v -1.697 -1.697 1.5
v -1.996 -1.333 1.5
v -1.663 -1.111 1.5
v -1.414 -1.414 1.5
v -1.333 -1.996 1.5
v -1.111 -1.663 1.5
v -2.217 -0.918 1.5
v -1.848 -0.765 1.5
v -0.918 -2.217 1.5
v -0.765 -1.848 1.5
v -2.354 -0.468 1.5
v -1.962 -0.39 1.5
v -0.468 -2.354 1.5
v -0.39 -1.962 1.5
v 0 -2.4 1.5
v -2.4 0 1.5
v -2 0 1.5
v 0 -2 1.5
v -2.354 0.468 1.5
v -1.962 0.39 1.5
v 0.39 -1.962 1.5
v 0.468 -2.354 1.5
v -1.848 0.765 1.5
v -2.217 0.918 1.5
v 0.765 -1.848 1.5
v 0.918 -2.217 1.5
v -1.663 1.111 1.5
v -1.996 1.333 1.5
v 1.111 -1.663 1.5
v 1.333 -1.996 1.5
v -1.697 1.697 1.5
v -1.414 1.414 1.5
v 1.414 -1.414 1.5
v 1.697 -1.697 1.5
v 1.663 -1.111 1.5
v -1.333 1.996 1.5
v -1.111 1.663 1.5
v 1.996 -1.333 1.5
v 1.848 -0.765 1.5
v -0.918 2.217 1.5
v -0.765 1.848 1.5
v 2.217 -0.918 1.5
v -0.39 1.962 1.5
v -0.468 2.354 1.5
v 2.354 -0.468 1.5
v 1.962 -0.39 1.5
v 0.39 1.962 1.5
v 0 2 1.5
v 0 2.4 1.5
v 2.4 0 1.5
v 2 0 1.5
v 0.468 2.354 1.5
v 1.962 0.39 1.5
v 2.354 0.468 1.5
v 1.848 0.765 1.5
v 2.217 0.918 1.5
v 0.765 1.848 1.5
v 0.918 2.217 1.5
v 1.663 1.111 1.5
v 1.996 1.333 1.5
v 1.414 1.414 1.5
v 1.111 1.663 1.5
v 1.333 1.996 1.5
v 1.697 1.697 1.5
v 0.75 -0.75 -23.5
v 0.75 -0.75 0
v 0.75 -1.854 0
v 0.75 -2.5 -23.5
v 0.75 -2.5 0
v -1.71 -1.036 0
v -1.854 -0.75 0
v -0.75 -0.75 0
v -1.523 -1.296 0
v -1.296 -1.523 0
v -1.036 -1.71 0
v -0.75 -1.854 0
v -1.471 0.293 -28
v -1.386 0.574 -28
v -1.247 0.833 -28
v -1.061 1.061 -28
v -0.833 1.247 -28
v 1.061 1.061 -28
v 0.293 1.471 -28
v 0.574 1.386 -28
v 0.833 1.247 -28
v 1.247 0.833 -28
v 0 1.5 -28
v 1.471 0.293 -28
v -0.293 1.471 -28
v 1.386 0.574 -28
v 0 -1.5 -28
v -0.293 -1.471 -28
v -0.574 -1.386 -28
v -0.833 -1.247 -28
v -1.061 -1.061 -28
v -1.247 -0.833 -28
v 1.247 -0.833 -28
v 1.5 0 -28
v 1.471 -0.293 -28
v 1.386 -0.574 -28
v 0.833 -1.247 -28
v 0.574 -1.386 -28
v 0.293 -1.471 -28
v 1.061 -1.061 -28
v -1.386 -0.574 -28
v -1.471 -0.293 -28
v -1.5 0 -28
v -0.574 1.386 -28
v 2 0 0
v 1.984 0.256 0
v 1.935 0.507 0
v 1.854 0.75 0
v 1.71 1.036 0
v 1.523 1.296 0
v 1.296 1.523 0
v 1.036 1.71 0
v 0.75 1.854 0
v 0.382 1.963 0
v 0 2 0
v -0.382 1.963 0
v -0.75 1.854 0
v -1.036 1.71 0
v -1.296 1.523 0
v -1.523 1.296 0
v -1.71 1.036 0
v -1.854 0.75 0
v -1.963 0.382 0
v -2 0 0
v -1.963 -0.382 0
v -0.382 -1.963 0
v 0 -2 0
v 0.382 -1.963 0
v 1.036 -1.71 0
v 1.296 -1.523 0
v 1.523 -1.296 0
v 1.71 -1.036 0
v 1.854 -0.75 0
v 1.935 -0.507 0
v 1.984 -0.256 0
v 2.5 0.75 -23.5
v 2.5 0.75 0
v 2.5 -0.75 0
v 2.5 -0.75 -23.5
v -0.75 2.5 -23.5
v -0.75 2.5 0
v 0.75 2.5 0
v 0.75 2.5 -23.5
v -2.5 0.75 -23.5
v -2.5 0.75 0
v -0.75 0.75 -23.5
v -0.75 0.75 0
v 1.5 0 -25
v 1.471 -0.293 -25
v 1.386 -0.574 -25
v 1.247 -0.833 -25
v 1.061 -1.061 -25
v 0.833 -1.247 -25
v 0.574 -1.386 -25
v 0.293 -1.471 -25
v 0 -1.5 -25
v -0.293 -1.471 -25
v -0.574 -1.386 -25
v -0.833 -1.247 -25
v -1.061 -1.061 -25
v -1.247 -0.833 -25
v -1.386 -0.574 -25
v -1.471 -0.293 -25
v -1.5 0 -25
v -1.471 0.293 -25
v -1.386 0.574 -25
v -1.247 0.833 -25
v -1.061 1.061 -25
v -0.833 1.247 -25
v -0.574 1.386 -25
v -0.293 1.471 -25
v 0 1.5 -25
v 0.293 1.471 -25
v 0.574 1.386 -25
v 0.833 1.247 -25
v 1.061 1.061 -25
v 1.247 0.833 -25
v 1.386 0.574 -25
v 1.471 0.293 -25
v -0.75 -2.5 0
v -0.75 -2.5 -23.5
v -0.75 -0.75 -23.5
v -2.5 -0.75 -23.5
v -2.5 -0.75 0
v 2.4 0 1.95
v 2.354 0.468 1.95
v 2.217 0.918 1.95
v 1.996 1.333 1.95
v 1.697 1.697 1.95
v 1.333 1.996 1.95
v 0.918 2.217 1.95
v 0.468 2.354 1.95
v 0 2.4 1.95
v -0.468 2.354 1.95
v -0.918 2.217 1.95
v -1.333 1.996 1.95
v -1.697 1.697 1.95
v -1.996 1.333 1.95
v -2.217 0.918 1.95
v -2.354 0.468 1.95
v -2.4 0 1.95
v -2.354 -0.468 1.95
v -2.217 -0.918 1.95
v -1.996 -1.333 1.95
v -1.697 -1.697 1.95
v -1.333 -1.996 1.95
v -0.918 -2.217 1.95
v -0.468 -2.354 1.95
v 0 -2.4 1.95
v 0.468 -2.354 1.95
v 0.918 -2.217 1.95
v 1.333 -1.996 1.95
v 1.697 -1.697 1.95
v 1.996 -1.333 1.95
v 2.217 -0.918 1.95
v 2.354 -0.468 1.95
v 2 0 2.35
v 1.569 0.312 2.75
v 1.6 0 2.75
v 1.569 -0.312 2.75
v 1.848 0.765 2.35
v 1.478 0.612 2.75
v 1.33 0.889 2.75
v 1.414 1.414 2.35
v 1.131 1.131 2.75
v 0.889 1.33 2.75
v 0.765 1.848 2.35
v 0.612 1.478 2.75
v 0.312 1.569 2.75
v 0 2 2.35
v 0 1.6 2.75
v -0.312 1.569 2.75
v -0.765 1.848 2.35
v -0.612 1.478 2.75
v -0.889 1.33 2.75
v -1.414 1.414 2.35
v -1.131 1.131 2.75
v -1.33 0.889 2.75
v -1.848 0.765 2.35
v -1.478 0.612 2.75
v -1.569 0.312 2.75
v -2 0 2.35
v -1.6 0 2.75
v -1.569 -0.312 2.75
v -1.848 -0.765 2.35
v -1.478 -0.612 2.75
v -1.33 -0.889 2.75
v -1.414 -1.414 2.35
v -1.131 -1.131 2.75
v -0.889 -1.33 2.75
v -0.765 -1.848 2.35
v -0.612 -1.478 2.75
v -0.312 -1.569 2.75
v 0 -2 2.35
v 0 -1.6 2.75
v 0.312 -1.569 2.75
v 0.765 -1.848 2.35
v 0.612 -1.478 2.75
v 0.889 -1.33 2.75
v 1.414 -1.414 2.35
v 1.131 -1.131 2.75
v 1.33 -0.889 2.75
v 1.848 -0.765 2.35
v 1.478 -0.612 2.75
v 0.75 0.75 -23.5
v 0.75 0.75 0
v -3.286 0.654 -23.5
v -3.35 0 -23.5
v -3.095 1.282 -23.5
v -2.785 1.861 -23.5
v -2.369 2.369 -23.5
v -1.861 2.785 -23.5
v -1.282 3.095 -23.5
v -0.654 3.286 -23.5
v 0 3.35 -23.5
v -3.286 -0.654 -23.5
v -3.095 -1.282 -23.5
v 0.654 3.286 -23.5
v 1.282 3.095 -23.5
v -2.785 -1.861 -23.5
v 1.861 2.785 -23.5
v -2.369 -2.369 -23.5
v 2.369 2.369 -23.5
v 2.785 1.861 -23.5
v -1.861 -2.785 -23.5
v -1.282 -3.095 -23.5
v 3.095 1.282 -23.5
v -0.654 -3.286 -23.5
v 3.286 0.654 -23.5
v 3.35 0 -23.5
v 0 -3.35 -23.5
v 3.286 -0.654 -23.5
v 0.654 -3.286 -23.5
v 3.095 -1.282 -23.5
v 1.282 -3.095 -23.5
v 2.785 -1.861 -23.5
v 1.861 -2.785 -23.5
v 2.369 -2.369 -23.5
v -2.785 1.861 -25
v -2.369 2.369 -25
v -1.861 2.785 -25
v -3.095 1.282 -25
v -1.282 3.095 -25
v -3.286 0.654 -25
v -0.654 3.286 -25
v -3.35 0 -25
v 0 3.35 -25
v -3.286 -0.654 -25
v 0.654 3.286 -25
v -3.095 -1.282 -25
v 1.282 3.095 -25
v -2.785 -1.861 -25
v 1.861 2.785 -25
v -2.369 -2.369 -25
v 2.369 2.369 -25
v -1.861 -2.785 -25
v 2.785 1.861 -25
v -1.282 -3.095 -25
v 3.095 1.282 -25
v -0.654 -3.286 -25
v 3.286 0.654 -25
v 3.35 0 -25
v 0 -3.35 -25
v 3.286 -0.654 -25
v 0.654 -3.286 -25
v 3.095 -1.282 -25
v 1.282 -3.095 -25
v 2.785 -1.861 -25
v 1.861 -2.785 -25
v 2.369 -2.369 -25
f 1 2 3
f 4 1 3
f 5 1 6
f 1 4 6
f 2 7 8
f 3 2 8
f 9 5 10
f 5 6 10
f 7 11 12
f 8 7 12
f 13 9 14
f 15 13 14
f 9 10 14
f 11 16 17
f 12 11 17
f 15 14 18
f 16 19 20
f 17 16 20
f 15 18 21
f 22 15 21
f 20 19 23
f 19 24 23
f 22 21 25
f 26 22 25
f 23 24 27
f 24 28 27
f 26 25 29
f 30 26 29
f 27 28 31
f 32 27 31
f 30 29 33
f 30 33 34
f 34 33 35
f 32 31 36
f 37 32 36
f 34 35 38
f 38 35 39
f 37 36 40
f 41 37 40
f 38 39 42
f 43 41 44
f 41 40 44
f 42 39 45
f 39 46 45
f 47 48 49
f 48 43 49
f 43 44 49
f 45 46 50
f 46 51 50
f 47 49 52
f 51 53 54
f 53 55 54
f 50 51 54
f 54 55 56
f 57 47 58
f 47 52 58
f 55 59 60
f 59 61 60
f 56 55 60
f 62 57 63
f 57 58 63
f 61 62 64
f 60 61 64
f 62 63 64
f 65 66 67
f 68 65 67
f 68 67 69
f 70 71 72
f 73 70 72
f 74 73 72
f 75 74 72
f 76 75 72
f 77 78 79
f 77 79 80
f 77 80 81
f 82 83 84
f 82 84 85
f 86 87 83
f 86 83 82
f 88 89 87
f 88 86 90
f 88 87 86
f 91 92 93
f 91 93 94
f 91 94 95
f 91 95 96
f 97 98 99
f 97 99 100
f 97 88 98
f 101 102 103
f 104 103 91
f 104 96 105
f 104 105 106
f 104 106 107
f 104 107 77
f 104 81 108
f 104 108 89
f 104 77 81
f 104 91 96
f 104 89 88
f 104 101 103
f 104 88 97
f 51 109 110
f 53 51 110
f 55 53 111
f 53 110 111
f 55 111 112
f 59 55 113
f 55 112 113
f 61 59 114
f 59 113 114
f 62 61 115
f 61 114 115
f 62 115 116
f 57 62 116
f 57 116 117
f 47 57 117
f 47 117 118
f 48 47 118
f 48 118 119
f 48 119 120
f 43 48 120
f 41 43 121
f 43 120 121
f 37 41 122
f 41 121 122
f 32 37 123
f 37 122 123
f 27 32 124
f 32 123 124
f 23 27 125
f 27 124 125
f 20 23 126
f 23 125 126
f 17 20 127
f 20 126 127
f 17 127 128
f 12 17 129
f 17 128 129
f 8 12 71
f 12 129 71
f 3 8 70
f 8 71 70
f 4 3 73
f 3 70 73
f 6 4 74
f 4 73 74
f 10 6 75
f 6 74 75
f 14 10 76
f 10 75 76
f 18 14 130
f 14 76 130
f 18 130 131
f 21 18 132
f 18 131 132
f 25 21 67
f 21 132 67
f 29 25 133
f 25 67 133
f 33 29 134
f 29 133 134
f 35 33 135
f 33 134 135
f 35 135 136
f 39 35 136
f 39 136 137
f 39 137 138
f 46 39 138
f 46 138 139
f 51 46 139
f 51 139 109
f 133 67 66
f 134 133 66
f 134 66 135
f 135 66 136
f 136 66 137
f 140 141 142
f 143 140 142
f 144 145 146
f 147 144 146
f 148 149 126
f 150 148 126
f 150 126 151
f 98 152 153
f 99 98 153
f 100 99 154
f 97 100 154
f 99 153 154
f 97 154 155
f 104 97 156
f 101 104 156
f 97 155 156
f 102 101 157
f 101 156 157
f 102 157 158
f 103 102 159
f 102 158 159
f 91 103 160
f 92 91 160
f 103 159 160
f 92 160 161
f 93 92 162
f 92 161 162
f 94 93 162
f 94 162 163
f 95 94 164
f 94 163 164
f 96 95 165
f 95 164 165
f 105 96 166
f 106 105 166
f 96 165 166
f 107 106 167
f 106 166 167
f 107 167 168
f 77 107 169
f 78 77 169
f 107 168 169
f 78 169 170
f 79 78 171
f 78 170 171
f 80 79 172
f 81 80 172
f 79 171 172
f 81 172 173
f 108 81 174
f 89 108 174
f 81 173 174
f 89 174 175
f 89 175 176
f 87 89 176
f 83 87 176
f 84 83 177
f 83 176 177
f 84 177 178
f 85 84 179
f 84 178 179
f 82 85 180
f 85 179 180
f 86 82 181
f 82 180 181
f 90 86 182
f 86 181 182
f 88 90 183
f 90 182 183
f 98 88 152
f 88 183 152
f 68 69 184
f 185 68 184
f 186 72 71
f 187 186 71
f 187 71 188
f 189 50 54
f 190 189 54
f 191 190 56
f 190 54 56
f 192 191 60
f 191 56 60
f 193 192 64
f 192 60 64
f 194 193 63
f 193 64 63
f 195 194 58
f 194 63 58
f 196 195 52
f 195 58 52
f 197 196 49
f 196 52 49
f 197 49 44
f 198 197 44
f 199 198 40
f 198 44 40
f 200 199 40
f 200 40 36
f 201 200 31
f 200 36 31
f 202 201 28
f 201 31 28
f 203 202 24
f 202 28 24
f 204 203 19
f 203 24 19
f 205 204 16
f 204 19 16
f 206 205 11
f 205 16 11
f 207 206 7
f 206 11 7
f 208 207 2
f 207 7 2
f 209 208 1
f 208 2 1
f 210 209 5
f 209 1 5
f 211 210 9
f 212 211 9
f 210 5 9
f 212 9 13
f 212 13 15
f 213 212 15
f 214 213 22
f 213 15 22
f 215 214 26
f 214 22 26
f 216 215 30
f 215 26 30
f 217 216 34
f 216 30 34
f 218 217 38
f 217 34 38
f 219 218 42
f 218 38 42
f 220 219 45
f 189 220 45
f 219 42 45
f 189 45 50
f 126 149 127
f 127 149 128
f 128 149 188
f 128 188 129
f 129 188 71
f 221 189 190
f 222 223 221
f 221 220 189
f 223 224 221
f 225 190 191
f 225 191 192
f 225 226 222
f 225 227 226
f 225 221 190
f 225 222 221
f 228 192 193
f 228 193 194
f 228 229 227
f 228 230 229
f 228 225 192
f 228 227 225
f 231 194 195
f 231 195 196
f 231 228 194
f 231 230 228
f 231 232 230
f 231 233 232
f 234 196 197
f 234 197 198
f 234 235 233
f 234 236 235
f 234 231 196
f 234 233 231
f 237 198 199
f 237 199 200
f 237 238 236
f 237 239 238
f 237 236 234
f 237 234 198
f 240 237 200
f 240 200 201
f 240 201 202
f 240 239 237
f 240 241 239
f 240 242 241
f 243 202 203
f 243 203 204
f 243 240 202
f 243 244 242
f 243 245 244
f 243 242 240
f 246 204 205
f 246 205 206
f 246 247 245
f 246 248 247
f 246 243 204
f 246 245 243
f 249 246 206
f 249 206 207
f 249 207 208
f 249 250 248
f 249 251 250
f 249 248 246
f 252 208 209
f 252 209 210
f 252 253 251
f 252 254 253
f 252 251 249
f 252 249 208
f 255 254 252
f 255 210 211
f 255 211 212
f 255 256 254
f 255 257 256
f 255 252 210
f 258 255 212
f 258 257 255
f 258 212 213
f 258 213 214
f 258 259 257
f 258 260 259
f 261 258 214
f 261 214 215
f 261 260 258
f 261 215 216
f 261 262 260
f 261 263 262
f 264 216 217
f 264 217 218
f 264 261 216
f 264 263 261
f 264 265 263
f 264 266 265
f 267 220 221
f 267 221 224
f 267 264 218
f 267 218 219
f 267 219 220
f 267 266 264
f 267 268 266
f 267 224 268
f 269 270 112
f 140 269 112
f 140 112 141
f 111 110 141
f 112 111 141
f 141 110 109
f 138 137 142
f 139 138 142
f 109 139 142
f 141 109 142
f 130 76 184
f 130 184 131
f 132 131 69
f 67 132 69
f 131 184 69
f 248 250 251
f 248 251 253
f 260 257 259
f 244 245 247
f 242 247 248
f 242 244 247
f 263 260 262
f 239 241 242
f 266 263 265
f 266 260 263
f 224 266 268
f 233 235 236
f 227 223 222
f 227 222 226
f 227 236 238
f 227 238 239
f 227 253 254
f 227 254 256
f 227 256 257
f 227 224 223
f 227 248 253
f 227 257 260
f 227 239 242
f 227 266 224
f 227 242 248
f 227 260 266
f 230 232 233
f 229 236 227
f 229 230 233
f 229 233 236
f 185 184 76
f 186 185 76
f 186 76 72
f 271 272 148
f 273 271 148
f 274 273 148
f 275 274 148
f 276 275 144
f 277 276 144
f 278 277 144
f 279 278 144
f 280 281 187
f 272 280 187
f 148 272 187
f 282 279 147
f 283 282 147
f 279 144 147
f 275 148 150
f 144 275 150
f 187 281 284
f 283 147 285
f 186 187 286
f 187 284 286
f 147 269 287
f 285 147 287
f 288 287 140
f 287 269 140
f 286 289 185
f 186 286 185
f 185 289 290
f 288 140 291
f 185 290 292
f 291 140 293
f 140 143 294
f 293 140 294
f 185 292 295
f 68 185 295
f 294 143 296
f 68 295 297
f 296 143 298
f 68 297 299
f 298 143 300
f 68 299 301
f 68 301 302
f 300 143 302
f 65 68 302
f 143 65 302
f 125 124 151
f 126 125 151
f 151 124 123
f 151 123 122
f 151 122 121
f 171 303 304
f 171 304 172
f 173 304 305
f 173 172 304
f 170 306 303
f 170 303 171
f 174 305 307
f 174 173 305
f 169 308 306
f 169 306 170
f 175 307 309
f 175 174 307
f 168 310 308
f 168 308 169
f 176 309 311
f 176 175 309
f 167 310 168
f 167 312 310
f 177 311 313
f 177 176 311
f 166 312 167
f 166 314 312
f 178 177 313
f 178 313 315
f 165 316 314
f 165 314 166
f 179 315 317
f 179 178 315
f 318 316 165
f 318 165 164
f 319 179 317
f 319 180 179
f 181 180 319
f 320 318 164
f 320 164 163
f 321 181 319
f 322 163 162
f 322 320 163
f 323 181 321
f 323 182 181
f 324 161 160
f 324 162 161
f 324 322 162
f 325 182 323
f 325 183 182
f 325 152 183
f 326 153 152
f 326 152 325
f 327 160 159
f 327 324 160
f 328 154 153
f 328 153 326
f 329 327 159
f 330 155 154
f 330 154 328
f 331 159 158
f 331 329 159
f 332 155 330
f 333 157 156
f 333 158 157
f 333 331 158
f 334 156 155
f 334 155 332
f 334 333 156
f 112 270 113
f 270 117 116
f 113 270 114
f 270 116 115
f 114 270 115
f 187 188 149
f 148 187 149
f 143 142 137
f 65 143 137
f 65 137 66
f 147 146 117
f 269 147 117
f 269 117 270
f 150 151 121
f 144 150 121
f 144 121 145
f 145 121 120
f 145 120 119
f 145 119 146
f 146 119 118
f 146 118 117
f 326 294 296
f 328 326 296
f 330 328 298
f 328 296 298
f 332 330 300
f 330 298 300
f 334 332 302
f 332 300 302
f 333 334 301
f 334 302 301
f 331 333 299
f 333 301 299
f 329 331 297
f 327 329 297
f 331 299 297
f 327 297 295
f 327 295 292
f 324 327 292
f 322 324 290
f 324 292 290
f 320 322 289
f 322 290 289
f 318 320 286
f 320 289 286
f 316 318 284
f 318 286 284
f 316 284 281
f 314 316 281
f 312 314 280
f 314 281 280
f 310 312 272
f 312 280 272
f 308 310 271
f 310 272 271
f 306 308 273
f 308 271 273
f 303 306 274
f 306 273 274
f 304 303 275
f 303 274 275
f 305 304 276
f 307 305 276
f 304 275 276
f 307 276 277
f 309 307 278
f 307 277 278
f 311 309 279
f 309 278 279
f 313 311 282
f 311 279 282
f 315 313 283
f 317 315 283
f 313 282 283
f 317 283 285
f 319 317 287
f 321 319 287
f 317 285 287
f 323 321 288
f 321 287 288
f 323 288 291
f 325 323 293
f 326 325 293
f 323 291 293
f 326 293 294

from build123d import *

# Parameters (mm, degrees)
F0_R      = 2
F1_DEPTH  = 1.5
F2_R      = 2.4
F2_R_2    = 2
F3_DEPTH  = 1.25
F4_SIZE   = 0.8
F6_DEPTH  = 23.5
F7_R      = 3.35
F8_DEPTH  = 1.5
F9_R      = 1.5
F10_DEPTH = 3


with BuildPart() as f1:
    # F0 (on Top) → F1 (new body)
    with BuildSketch(Plane.XY):
        Circle(F0_R)
    extrude(amount=F1_DEPTH)

    # F2 (on face) → F3 (join)
    with BuildSketch(Plane.XY.offset(1.5)):
        Circle(F2_R)
        Circle(F2_R_2, mode=Mode.SUBTRACT)
        Circle(F2_R_2)
    extrude(amount=F3_DEPTH)

    # F4
    f4_edges = [f1.edges().sort_by_distance(p)[0] for p in [
        (-2.4, 0, 2.75),
    ]]
    chamfer(f4_edges, length=F4_SIZE)

    # F5 (on face) → F6 (join)
    with BuildSketch(Plane(origin=(0, 0, 0), x_dir=(1, 0, 0), z_dir=(0, 0, -1))):
        with BuildLine():
            ThreePointArc((0.75, -1.85405), (0, -2), (-0.75, -1.85405))
            Line((-0.75, -1.85405), (-0.75, -2.5))
            Line((-0.75, -2.5), (0, -2.5))
            Line((0, -2.5), (0.75, -2.5))
            Line((0.75, -2.5), (0.75, -1.85405))
        make_face()
        with BuildLine():
            Line((-2.5, 0.75), (-2.5, 0))
            Line((-2.5, 0), (-2.5, -0.75))
            Line((-2.5, -0.75), (-1.85405, -0.75))
            ThreePointArc((-1.85405, -0.75), (-2, 0), (-1.85405, 0.75))
            Line((-1.85405, 0.75), (-2.5, 0.75))
        make_face()
        with BuildLine():
            Line((-0.75, 2.5), (-0.75, 1.85405))
            ThreePointArc((-0.75, 1.85405), (0, 2), (0.75, 1.85405))
            Line((0.75, 1.85405), (0.75, 2.5))
            Line((0.75, 2.5), (0, 2.5))
            Line((0, 2.5), (-0.75, 2.5))
        make_face()
        with BuildLine():
            ThreePointArc((2, 0), (1.963173, -0.382035), (1.85405, -0.75))
            Line((1.85405, -0.75), (2.5, -0.75))
            Line((2.5, -0.75), (2.5, 0))
            Line((2.5, 0), (2.5, 0.75))
            Line((2.5, 0.75), (1.85405, 0.75))
            ThreePointArc((1.85405, 0.75), (1.963173, 0.382035), (2, 0))
        make_face()
        with BuildLine():
            ThreePointArc((-1.85405, 0.75), (-2, 0), (-1.85405, -0.75))
            Line((-1.85405, -0.75), (-0.75, -0.75))
            Line((-0.75, -0.75), (-0.75, -1.85405))
            ThreePointArc((-0.75, -1.85405), (0, -2), (0.75, -1.85405))
            Line((0.75, -1.85405), (0.75, -0.75))
            Line((0.75, -0.75), (1.85405, -0.75))
            ThreePointArc((1.85405, -0.75), (1.963173, -0.382035), (2, 0))
            ThreePointArc((2, 0), (1.963173, 0.382035), (1.85405, 0.75))
            Line((1.85405, 0.75), (0.75, 0.75))
            Line((0.75, 0.75), (0.75, 1.85405))
            ThreePointArc((0.75, 1.85405), (0, 2), (-0.75, 1.85405))
            Line((-0.75, 1.85405), (-0.75, 0.75))
            Line((-0.75, 0.75), (-1.85405, 0.75))
        make_face()
    extrude(amount=F6_DEPTH)

    # F7 (on face) → F8 (join)
    with BuildSketch(Plane(origin=(0, 0, -23.5), x_dir=(1, 0, 0), z_dir=(0, 0, -1))):
        Circle(F7_R)
        Polygon((0.75, -2.5), (-0.75, -2.5), (-0.75, -0.75), (-2.5, -0.75), (-2.5, 0.75), (-0.75, 0.75), (-0.75, 2.5), (0.75, 2.5), (0.75, 0.75), (2.5, 0.75), (2.5, -0.75), (0.75, -0.75), align=None, mode=Mode.SUBTRACT)
        Polygon((-0.75, -0.75), (-0.75, -2.5), (0.75, -2.5), (0.75, -0.75), (2.5, -0.75), (2.5, 0.75), (0.75, 0.75), (0.75, 2.5), (-0.75, 2.5), (-0.75, 0.75), (-2.5, 0.75), (-2.5, -0.75), align=None)
    extrude(amount=F8_DEPTH)

    # F9 (on face) → F10 (join)
    with BuildSketch(Plane(origin=(0, 0, -25), x_dir=(1, 0, 0), z_dir=(0, 0, -1))):
        Circle(F9_R)
    extrude(amount=F10_DEPTH)


solid = f1.part
